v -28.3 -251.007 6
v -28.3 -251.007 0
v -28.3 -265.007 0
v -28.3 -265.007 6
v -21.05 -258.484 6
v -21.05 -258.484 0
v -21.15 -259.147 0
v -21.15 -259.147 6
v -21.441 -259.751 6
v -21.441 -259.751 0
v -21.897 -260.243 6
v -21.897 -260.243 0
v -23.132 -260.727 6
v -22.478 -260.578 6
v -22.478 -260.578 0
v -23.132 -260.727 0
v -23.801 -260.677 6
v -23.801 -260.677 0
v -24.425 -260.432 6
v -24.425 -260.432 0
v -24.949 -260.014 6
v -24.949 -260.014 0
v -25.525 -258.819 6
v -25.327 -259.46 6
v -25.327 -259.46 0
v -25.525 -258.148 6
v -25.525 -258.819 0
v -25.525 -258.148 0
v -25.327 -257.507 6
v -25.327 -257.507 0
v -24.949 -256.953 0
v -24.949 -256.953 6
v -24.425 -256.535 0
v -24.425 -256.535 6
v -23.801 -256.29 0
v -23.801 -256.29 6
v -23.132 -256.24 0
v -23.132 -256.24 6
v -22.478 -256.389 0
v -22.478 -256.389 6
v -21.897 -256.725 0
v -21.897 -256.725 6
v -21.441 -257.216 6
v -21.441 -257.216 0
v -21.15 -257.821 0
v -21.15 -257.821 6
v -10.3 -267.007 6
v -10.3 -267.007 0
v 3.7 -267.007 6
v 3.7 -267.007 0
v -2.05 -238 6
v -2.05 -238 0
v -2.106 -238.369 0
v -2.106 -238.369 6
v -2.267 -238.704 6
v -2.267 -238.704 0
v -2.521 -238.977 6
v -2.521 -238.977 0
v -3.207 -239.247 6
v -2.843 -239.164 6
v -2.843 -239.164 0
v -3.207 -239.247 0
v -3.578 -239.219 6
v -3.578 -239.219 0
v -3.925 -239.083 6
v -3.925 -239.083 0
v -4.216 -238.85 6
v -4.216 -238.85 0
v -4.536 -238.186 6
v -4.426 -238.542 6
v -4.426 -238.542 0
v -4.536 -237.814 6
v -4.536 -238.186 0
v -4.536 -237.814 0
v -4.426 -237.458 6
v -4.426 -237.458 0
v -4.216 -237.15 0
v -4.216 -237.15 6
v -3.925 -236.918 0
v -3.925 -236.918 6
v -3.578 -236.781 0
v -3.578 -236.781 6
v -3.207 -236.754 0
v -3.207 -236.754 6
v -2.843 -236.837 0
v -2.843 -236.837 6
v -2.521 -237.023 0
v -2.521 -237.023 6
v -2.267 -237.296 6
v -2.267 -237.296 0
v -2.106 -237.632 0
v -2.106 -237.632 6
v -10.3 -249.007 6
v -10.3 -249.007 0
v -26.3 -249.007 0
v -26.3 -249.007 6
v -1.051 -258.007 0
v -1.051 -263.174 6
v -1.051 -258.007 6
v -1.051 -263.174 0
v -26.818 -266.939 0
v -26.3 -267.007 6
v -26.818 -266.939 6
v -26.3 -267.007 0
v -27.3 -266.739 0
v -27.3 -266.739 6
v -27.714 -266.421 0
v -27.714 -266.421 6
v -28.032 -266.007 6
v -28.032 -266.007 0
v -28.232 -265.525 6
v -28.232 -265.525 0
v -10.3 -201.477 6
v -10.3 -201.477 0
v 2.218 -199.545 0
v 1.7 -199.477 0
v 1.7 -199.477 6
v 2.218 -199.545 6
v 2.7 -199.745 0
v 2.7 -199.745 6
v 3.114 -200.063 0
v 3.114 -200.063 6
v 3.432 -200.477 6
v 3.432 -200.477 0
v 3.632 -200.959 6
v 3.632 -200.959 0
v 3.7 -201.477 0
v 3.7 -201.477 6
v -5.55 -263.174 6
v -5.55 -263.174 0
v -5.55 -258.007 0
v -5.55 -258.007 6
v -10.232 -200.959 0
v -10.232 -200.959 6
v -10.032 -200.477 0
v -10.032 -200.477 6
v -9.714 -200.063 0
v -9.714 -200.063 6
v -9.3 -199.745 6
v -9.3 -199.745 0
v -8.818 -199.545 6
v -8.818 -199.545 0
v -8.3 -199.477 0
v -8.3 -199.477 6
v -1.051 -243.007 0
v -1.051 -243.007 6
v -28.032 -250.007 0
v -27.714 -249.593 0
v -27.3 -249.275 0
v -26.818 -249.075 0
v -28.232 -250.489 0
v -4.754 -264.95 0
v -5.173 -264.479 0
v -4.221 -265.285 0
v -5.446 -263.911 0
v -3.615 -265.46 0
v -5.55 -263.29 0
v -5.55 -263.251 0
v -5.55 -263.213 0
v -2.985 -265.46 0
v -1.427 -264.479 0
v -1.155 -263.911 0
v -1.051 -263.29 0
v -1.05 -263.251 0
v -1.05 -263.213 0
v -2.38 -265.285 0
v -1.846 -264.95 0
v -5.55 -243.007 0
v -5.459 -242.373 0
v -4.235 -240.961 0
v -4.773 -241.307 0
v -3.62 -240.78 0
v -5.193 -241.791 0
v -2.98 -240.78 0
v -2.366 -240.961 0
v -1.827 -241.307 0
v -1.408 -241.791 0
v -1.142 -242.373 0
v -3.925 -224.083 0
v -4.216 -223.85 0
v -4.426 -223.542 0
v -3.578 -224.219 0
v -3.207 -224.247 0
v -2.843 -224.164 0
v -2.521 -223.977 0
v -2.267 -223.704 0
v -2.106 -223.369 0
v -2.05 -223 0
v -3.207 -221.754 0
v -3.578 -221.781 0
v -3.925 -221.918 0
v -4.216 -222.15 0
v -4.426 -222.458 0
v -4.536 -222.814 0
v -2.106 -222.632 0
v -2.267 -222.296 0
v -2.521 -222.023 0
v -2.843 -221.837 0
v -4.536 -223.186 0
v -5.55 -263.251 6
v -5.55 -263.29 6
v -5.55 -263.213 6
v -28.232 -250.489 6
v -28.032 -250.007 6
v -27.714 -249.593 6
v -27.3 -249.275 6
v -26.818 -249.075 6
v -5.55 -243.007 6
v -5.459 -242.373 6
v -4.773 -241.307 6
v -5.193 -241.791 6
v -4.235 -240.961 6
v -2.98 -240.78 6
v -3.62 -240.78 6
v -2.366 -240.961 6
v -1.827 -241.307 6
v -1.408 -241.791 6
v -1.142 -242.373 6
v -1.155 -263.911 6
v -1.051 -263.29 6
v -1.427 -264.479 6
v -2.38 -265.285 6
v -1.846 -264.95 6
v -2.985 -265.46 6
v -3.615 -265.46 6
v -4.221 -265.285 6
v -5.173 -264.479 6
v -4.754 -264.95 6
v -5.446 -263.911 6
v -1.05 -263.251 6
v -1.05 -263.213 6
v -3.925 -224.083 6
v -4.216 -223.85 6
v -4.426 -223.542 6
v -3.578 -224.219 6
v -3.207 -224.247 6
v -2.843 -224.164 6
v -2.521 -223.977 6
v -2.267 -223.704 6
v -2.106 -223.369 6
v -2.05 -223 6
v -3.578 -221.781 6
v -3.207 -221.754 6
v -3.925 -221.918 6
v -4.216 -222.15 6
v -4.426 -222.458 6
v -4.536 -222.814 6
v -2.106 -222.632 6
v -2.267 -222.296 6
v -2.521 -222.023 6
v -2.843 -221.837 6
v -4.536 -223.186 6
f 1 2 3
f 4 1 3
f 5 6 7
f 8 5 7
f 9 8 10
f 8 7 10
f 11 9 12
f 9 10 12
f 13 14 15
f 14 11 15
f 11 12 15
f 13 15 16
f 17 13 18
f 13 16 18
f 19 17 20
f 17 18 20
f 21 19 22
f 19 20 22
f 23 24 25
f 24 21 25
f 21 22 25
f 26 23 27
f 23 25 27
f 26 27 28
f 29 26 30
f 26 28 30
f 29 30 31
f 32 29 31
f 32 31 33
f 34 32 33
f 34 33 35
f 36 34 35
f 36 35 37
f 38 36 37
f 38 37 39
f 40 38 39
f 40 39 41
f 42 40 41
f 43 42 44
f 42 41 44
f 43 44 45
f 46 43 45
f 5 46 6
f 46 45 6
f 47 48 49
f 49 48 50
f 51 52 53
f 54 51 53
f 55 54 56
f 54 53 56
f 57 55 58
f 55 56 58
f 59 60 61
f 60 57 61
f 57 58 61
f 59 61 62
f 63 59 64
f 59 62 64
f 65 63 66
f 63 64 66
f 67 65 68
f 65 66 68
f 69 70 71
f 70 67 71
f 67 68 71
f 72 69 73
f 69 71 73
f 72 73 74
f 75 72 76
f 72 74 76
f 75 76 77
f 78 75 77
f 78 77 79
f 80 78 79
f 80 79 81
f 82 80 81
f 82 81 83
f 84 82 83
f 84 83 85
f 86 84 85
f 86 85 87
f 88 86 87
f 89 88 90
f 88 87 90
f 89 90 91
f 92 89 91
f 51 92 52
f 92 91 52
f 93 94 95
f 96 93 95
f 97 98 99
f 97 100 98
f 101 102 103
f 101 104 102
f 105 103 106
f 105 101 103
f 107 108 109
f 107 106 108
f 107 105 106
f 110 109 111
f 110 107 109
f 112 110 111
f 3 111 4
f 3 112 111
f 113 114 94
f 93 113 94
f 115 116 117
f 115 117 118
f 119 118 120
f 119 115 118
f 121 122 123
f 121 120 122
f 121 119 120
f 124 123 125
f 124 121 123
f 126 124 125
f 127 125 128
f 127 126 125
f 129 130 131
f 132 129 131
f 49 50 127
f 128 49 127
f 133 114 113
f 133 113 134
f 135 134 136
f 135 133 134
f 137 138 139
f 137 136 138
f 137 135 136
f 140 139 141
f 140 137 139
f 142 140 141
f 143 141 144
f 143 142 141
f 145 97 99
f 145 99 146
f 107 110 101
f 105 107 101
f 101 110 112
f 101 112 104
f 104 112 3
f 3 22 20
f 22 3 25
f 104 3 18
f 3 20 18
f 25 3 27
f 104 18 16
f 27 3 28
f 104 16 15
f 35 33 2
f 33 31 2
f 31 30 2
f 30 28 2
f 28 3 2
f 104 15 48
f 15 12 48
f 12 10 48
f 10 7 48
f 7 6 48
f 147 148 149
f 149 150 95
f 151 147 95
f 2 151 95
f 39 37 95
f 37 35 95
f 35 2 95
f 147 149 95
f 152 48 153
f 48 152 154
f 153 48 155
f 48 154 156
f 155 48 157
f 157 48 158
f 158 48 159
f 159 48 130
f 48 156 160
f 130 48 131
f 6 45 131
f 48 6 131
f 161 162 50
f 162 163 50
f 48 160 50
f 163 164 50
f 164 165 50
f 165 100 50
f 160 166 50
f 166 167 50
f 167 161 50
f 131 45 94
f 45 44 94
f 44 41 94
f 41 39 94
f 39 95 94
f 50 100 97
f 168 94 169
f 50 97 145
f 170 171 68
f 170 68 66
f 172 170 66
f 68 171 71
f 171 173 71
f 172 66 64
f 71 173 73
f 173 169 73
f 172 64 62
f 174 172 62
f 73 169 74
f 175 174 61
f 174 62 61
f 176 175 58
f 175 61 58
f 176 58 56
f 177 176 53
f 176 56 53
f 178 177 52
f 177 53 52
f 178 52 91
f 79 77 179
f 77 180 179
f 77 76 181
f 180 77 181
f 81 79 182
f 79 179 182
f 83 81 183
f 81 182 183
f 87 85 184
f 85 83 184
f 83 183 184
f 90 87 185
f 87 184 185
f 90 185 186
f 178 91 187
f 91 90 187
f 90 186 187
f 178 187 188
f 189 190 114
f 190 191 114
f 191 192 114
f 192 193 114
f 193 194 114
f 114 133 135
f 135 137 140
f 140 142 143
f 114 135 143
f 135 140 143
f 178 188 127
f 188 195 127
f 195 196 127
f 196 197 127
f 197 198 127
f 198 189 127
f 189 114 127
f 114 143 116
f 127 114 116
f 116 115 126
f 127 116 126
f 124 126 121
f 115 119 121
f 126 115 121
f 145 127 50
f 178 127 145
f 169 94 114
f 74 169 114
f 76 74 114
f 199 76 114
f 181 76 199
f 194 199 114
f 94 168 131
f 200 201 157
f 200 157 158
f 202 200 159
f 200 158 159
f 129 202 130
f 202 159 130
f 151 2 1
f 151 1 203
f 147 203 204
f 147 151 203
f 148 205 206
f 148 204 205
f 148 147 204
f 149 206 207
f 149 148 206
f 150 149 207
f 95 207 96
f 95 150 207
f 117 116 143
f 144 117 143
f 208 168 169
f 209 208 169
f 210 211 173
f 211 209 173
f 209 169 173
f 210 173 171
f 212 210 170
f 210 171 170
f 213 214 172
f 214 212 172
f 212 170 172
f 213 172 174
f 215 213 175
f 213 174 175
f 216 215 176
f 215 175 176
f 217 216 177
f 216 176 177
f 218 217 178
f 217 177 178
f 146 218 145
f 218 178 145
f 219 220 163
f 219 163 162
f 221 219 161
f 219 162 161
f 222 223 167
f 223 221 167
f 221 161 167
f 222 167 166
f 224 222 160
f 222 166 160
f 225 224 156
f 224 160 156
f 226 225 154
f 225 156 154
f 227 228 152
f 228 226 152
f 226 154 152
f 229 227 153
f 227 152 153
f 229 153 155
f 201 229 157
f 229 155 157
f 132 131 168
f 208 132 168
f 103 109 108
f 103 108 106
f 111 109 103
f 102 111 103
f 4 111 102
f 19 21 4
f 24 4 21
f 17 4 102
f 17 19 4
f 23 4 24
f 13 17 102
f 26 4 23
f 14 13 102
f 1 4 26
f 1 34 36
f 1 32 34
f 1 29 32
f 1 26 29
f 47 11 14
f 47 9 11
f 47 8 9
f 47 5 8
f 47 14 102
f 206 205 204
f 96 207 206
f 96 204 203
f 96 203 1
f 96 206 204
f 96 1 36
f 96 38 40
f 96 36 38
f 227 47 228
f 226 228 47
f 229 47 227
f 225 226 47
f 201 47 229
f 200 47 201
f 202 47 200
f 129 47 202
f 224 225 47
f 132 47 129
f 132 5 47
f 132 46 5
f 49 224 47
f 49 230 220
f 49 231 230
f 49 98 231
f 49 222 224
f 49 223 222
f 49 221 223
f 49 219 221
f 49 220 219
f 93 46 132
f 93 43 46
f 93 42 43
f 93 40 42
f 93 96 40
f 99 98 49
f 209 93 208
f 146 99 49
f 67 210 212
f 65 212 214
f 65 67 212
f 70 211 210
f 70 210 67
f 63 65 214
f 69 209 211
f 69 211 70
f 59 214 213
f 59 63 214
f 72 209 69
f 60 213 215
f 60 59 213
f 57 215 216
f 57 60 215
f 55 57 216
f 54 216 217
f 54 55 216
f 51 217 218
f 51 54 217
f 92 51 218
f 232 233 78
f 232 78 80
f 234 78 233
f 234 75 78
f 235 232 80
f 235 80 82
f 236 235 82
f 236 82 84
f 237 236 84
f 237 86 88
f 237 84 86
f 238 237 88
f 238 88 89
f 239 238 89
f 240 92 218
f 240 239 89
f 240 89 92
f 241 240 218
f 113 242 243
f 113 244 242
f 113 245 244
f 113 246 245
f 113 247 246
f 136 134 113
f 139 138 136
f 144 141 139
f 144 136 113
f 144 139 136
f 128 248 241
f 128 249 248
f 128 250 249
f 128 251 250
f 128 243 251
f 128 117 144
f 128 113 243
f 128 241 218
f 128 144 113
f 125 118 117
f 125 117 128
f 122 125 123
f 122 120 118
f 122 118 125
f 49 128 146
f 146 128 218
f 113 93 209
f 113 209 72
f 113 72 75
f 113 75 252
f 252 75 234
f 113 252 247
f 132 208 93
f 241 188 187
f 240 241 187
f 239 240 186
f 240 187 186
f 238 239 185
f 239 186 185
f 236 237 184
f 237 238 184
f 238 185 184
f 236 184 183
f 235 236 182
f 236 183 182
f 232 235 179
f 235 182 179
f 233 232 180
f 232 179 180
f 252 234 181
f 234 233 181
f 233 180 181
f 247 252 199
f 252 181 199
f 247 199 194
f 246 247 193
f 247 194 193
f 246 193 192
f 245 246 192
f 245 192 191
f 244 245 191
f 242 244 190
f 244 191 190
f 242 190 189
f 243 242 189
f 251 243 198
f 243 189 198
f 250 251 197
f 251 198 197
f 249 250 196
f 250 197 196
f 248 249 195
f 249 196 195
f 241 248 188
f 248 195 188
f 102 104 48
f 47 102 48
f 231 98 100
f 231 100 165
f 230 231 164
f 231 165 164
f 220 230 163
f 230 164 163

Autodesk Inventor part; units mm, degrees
ref_plane "YZ Plane" through (0, 0, 0) normal (1, 0, 0) x (0, 1, 0)
ref_plane "XZ Plane" through (0, 0, 0) normal (0, 1, 0) x (-1, 0, 0)
ref_plane "XY Plane" through (0, 0, 0) normal (0, 0, 1) x (1, 0, 0)
ref_plane "РабПлоскость1" through (0, 0, 0) normal (0, 0, 1) x (1, 0, 0)
sketch "Эскиз1" plane through (0, 0, 0) normal (0, 0, 1) x (1, 0, 0)
  line L0 (-10.3, -267.007) -> (3.7, -267.007)
  line L1 (-26.3, -267.007) -> (-10.3, -267.007) projected
  arc A0 (-28.3, -265.007) -> (-26.3, -267.007) centre (-26.3, -265.007) ccw projected
  line L2 (-28.3, -251.007) -> (-28.3, -265.007) projected
  arc A1 (-26.3, -249.007) -> (-28.3, -251.007) centre (-26.3, -251.007) ccw projected
  line L3 (-10.3, -249.007) -> (-26.3, -249.007) projected
  line L4 (-10.3, -201.4771) -> (-10.3, -249.007) projected
  arc A2 (-8.3, -199.4771) -> (-10.3, -201.4771) centre (-8.3, -201.4771) ccw projected
  line L5 (1.7, -199.4771) -> (-8.3, -199.4771) projected
  arc A3 (3.7, -201.4771) -> (1.7, -199.4771) centre (1.7, -201.4771) ccw projected
  line L6 (3.7, -267.007) -> (3.7, -201.4771) projected
  line L7 (3.7, -267.007) -> (-10.3, -267.007)
  line L8 (-1.0506, -258.007) -> (-1.0506, -243.007)
  line L9 (-5.5498, -258.007) -> (-5.5498, -243.007)
  arc A4 (-1.0506, -243.007) -> (-5.5498, -243.007) centre (-3.3002, -243.007) ccw
  arc A5 (-5.5498, -263.1742) -> (-1.0506, -263.1742) centre (-3.3002, -263.2319) ccw
  line L10 (-5.5498, -263.2896) -> (-5.5498, -258.007)
  line L11 (-1.0506, -263.2896) -> (-1.0506, -258.007)
  circle A6 centre (-23.3, -258.4837) radius 2.25 projected
  circle A7 centre (-3.3, -238.0001) radius 1.25 projected
  circle A8 centre (-3.3, -223.0001) radius 1.25 projected
  point P0 (0, 0)
  dimension "d2" = 15
extrude "Выдавливание1" add sketch "Эскиз1" along normal blind 6
sketch "Эскиз2" plane through (0, 0, 0) normal (0, 0, -1) x (-1, 0, 0)
  line L0 (10.3, -225.242) -> (-3.7, -225.242)
  circle A0 centre (3.3, -238.0001) radius 1.25 projected
  circle A1 centre (3.3, -229.8361) radius 1.25
  line L1 (26.3, -267.007) -> (-3.7, -267.007) projected
  arc A2 (26.3, -267.007) -> (28.3, -265.007) centre (26.3, -265.007) ccw projected
  line L2 (28.3, -251.007) -> (28.3, -265.007) projected
  arc A3 (28.3, -251.007) -> (26.3, -249.007) centre (26.3, -251.007) ccw projected
  line L3 (10.3, -249.007) -> (26.3, -249.007) projected
  circle A4 centre (23.3, -258.4837) radius 2.25 projected
  line L4 (1.0506, -243.007) -> (1.0506, -263.1742) projected
  arc A5 (5.5498, -243.007) -> (1.0506, -243.007) centre (3.3002, -243.007) ccw projected
  line L5 (5.5498, -263.1742) -> (5.5498, -243.007) projected
  arc A6 (1.0506, -263.1742) -> (5.5498, -263.1742) centre (3.3002, -263.2319) ccw projected
  line L6 (-3.7, -225.242) -> (-3.7, -267.007)
  line L7 (10.3, -249.007) -> (10.3, -225.242)
  point P0 (0, 0)
properties part number "крепление ремня"
